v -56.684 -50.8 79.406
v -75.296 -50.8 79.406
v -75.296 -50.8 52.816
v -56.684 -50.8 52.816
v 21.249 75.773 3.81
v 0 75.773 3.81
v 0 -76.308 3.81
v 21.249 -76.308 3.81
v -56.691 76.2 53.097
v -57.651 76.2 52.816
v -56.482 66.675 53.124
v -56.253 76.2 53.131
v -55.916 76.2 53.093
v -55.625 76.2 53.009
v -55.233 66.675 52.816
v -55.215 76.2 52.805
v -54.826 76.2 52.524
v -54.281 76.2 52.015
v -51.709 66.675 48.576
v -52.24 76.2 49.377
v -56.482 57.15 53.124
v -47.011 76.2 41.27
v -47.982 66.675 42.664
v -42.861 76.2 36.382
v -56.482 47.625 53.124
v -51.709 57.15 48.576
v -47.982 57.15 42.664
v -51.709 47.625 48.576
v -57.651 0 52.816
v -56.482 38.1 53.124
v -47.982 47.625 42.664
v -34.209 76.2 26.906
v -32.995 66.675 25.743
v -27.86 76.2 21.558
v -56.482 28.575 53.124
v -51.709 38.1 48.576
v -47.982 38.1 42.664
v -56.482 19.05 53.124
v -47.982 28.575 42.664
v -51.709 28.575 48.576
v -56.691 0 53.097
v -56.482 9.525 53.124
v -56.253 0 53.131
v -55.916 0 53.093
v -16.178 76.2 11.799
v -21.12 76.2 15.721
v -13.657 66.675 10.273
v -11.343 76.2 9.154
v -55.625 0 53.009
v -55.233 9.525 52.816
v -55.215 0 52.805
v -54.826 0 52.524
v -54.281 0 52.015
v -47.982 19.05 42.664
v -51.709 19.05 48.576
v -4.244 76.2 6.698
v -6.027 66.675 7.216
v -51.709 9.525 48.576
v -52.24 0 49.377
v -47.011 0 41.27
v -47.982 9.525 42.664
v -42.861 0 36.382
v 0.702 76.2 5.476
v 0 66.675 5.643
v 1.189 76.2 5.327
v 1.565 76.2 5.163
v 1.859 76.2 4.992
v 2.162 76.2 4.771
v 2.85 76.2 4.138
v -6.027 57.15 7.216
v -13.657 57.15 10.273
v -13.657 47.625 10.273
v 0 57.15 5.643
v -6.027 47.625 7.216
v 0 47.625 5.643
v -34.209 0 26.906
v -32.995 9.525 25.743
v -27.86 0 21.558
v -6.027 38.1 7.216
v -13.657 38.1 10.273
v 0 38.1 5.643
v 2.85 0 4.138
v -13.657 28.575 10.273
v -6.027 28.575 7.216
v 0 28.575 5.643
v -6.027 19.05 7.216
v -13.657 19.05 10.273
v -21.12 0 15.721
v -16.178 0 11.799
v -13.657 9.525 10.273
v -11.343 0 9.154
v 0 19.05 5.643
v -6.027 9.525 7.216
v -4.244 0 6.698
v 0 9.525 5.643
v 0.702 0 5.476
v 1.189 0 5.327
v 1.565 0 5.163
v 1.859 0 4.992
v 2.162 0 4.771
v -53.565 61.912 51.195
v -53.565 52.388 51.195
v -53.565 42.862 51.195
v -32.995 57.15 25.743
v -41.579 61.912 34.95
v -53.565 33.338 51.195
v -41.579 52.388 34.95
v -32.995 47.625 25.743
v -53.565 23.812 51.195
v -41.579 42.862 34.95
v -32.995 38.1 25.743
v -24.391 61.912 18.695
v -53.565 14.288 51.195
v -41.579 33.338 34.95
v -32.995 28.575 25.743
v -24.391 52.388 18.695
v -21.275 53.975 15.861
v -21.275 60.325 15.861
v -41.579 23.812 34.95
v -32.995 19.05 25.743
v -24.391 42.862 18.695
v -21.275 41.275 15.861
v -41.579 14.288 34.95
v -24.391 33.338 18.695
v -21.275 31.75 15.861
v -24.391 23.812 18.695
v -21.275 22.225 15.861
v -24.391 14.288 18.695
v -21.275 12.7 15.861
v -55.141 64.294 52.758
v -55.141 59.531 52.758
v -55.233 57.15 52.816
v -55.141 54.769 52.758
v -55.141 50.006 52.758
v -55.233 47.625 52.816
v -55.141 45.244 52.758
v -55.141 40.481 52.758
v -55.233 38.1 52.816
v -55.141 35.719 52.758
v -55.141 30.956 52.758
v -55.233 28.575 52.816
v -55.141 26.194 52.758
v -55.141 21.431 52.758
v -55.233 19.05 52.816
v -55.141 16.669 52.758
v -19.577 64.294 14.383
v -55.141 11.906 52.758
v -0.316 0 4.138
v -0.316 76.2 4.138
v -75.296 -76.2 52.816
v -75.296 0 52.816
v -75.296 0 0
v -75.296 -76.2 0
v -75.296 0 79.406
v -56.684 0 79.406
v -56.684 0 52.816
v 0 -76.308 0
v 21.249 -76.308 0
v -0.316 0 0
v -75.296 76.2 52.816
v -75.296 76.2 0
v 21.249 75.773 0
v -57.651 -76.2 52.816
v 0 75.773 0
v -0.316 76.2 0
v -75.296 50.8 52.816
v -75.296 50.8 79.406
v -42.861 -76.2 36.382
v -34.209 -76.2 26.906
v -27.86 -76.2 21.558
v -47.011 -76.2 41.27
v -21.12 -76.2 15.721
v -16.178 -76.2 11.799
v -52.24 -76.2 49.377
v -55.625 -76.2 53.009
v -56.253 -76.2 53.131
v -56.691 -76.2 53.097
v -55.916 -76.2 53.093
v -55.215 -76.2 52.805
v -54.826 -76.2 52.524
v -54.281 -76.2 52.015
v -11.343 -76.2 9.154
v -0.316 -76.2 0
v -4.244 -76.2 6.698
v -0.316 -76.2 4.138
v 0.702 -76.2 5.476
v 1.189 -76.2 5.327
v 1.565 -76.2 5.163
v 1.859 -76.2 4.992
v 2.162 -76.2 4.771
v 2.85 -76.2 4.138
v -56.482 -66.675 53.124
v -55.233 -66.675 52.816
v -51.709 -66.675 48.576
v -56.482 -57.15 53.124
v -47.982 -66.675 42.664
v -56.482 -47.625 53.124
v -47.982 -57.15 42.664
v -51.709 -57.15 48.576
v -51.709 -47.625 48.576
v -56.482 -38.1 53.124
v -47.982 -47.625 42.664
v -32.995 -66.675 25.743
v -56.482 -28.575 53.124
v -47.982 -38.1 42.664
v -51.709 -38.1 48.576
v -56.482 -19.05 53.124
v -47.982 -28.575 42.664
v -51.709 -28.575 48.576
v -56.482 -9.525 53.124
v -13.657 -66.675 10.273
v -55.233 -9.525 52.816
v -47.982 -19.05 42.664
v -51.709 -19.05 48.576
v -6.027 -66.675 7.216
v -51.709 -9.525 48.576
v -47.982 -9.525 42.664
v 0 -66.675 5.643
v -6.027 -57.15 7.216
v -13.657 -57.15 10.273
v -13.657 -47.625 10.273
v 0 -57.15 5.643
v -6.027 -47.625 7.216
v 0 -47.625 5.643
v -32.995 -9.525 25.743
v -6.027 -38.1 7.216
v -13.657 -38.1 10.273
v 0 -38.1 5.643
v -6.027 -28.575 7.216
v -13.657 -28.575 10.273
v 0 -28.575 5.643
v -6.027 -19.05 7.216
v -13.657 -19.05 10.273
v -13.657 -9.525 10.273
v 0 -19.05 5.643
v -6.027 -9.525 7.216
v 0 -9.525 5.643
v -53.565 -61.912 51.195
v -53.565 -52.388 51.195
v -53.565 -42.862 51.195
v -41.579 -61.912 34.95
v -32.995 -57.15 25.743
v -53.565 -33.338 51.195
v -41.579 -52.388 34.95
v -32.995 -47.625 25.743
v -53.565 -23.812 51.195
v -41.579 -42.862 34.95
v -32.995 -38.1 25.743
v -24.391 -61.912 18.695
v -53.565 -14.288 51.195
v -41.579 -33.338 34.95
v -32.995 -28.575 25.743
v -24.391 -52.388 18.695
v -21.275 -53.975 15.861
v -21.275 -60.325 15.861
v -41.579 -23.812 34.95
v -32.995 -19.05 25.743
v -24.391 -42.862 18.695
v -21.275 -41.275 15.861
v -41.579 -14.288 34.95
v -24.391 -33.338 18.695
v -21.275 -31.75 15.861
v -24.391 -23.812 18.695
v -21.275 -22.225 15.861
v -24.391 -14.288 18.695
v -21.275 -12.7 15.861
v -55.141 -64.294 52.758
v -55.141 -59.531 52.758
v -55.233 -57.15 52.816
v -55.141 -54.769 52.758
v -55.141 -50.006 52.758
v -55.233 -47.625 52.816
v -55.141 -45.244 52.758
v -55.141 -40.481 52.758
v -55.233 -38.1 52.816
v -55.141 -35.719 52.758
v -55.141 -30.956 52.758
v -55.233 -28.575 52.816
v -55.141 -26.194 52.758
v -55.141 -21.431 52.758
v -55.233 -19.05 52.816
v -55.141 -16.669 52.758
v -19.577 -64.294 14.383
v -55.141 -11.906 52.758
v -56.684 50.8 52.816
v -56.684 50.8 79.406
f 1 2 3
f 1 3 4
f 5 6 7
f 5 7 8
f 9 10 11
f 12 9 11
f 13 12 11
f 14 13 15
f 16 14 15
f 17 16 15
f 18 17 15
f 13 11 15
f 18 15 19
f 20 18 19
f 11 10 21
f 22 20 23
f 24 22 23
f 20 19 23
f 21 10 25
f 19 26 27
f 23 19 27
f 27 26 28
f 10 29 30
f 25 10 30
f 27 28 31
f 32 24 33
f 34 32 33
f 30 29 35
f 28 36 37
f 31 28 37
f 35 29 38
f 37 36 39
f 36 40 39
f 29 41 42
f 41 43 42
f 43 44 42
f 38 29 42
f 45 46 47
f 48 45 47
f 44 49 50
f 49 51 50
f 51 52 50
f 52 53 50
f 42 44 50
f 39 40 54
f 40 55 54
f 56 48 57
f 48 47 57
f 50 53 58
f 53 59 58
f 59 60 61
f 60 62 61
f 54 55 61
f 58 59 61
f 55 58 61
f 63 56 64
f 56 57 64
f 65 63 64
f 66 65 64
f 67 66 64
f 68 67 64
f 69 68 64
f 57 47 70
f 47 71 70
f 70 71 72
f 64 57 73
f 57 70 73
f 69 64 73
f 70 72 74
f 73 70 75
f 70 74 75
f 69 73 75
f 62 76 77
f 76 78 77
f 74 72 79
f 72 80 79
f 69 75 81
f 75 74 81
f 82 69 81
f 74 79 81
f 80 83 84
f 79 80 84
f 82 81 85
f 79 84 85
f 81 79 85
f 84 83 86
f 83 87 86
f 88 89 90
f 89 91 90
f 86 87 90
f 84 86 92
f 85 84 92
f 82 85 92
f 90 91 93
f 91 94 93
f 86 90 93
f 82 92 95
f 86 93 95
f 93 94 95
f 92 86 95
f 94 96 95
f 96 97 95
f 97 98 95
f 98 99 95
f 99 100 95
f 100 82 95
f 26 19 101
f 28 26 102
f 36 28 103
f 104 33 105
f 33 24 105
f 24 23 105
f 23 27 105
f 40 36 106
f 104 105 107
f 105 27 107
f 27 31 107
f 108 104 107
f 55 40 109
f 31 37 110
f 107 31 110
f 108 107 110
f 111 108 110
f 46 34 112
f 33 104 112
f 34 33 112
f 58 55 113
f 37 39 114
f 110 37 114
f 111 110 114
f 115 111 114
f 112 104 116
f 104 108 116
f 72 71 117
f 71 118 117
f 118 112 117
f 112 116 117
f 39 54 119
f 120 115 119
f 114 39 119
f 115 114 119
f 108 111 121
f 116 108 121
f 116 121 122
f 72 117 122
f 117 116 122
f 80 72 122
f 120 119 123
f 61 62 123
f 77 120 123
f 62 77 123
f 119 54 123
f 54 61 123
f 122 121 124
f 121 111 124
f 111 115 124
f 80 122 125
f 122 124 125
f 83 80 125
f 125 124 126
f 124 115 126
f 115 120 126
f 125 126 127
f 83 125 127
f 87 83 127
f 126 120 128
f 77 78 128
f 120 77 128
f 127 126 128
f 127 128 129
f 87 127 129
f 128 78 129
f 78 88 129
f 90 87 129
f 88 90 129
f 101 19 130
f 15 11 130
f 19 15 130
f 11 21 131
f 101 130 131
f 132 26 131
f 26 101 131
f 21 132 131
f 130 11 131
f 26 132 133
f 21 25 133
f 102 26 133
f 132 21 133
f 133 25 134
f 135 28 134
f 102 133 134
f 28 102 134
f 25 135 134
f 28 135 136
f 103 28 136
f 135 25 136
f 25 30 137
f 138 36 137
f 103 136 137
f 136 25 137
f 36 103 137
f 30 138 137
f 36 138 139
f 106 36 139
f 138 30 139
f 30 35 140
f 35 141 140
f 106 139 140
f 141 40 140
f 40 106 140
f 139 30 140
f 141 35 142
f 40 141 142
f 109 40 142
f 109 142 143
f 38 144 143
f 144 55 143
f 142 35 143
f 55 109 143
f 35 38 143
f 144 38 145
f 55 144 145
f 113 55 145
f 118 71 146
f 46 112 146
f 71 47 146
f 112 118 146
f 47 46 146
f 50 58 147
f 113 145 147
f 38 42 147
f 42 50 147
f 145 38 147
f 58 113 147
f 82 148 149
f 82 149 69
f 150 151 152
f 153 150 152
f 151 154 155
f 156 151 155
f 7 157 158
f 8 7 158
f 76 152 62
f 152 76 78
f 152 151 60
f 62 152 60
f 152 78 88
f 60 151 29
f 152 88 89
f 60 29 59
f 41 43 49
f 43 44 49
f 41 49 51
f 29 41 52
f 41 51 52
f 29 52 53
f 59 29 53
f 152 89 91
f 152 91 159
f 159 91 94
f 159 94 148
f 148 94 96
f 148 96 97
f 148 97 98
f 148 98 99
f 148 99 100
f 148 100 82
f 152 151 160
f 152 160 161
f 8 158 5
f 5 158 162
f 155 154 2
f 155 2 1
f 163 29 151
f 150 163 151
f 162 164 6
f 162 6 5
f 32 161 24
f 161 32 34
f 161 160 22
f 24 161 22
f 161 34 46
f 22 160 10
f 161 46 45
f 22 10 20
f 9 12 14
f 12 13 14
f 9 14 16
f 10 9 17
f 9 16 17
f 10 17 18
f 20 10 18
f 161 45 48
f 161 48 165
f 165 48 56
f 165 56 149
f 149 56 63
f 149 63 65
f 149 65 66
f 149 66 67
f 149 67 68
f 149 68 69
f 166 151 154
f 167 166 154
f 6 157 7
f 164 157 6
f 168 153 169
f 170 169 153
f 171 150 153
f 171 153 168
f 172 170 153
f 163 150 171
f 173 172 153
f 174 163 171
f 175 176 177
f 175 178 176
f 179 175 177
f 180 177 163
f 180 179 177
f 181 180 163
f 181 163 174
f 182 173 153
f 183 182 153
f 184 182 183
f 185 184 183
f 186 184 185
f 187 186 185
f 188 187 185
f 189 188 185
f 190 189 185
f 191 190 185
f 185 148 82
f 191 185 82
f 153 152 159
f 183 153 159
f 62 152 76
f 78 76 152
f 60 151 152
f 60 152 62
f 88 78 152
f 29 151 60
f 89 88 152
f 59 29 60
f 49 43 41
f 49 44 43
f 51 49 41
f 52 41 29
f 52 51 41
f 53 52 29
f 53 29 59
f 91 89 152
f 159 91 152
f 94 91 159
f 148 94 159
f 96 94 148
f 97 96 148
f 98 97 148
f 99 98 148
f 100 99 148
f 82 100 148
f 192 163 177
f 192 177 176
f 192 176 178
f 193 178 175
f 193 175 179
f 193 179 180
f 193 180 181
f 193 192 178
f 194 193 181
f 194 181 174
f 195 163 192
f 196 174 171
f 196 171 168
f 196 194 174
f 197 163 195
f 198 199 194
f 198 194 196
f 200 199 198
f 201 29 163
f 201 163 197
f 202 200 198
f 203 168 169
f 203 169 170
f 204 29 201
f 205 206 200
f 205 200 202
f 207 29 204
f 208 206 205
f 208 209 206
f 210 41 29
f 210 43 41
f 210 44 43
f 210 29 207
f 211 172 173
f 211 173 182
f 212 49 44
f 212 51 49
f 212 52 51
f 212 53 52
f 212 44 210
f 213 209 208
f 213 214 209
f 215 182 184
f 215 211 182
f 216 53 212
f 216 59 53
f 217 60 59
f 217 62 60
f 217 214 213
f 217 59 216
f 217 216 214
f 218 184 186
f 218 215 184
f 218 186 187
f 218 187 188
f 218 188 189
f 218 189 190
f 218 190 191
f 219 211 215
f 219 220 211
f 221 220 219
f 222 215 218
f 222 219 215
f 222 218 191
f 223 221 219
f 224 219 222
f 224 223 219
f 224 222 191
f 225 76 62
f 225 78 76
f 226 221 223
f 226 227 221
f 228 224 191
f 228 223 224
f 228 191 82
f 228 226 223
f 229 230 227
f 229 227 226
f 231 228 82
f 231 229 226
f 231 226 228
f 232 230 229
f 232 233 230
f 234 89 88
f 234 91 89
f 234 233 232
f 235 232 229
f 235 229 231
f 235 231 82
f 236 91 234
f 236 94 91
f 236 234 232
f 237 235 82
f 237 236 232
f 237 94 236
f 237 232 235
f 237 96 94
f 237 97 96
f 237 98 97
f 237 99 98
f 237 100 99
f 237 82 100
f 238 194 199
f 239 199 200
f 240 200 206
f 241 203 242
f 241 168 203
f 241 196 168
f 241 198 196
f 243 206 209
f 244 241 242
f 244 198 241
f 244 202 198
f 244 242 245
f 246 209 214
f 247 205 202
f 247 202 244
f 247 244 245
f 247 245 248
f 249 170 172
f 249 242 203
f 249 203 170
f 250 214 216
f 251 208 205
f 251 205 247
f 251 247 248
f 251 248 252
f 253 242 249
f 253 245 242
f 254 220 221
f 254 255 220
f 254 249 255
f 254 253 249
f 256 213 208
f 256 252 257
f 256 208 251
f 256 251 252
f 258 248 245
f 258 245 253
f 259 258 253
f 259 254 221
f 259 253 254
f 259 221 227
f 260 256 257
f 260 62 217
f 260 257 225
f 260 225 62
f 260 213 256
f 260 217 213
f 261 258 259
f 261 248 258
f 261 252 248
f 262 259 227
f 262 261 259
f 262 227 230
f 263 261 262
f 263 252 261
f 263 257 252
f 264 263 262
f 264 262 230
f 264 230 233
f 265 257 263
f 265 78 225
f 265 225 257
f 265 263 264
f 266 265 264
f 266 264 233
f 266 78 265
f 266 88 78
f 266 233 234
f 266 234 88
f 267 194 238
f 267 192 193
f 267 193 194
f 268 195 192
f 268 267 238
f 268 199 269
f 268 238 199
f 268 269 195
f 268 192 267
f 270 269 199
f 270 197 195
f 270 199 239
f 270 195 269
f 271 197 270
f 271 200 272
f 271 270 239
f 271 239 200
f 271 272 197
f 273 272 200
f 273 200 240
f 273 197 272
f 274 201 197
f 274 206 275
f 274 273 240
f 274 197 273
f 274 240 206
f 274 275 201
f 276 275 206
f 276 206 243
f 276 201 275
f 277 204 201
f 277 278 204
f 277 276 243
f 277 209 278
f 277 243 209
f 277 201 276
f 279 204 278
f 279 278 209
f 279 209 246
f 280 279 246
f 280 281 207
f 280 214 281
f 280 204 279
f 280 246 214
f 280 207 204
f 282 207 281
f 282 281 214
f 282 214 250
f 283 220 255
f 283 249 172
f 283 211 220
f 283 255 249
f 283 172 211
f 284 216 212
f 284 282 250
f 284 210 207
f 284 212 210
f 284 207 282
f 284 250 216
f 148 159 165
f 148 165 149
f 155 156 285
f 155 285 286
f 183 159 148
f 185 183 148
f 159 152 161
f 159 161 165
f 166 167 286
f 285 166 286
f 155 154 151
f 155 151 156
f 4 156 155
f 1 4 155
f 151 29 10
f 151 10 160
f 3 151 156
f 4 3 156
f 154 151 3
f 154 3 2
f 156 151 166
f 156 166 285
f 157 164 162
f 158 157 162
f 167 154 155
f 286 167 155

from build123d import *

# Parameters (mm, degrees)
F0_W     = 21.2485753
F0_H     = 152.0810052752
F1_DEPTH = 3.81
F3_DEPTH = 76.2
F4_DEPTH = 76.2
F5_W     = 18.6125934124
F5_H     = 26.5894271433
F6_DEPTH = 50.8
F7_DEPTH = 50.8
F8_W     = 14.3147837371
F8_H     = 9.378656745
F8_W_2   = 14.0679730102
F8_H_2   = 9.6254572272
F8_W_3   = 12.587139383
F8_H_3   = 9.8722651601
F8_W_4   = 17.029652372
F8_H_4   = 8.6382329464
F9_DEPTH = 58.42


with BuildPart() as f1:
    # F0 (on Top) → F1 (new body)
    with BuildSketch(Plane.XY):
        with Locations((10.62428765, -0.267278403)):
            Rectangle(F0_W, F0_H)
    extrude(amount=F1_DEPTH)

    # F8 (on Right) → F9 (cut)
    with BuildSketch(Plane.YZ):
        with Locations((-12.2708184645, 67.8704231977)):
            Rectangle(F8_W, F8_H)
        with Locations((14.0140862204, 67.7470229566)):
            Rectangle(F8_W_2, F8_H_2)
        with Locations((-31.6451368853, 68.610843271)):
            Rectangle(F8_W_3, F8_H_3)
        with Locations((36.2266814336, 67.9938271642)):
            Rectangle(F8_W_4, F8_H_4)
    extrude(amount=F9_DEPTH, mode=Mode.SUBTRACT)


with BuildPart() as f3:
    # F2 (on Front) → F3 (new body)
    with BuildSketch(Plane.XZ):
        with BuildLine():
            Line((-57.6507113874, 52.8162680566), (-75.2964168787, 52.8162680566))
            Line((-75.2964168787, 52.8162680566), (-75.2964168787, 0))
            Line((-75.2964168787, 0), (-0.3163424553, 0))
            Line((-0.3163424553, 0), (-0.3163424553, 4.1380482726))
            Line((-0.3163424553, 4.1380482726), (0, 4.1380482726))
            Line((0, 4.1380482726), (2.8498747852, 4.1380482726))
            add(Edge.make_bspline(
                [(-57.6507113874, 52.8162680566), (-56.8602710351, 53.0909142445), (-54.4734343004, 53.9754583667), (-47.8569322788, 41.5681647897), (-42.6244117505, 36.3349742464), (-33.1344303149, 25.0647868759), (-24.9495881789, 19.8402240782), (-15.0670263369, 9.131632398), (0.2232942838, 5.5783015486), (1.763578778, 5.2483250845), (2.8498747852, 4.1380482726)],
                knots=[0, 0, 0, 0, 0.0638100825, 0.2087782801, 0.3302444576, 0.4830091729, 0.6125782664, 0.7704626352, 0.9263194399, 1, 1, 1, 1], degree=3))
        make_face()
    extrude(amount=F3_DEPTH)


with BuildPart() as f4:
    # F4 (new): a face of the model
    f4_faces = [f3.part.faces().sort_by_distance(p)[0] for p in [
        (-49.6360039473, 0, 20.6655846492),
    ]]
    extrude(f4_faces, amount=F4_DEPTH)


with BuildPart() as f6:
    # F5 (on Front) → F6 (new body)
    with BuildSketch(Plane.XZ):
        with Locations((-65.9901201725, 66.1109816283)):
            Rectangle(F5_W, F5_H)
    extrude(amount=F6_DEPTH)


with BuildPart() as f7:
    # F7 (new): a face of the model
    f7_faces = [f6.part.faces().sort_by_distance(p)[0] for p in [
        (-65.9901201725, 0, 66.1109816283),
    ]]
    extrude(f7_faces, amount=F7_DEPTH)


solid = Compound([f1.part, f3.part, f4.part, f6.part, f7.part])
